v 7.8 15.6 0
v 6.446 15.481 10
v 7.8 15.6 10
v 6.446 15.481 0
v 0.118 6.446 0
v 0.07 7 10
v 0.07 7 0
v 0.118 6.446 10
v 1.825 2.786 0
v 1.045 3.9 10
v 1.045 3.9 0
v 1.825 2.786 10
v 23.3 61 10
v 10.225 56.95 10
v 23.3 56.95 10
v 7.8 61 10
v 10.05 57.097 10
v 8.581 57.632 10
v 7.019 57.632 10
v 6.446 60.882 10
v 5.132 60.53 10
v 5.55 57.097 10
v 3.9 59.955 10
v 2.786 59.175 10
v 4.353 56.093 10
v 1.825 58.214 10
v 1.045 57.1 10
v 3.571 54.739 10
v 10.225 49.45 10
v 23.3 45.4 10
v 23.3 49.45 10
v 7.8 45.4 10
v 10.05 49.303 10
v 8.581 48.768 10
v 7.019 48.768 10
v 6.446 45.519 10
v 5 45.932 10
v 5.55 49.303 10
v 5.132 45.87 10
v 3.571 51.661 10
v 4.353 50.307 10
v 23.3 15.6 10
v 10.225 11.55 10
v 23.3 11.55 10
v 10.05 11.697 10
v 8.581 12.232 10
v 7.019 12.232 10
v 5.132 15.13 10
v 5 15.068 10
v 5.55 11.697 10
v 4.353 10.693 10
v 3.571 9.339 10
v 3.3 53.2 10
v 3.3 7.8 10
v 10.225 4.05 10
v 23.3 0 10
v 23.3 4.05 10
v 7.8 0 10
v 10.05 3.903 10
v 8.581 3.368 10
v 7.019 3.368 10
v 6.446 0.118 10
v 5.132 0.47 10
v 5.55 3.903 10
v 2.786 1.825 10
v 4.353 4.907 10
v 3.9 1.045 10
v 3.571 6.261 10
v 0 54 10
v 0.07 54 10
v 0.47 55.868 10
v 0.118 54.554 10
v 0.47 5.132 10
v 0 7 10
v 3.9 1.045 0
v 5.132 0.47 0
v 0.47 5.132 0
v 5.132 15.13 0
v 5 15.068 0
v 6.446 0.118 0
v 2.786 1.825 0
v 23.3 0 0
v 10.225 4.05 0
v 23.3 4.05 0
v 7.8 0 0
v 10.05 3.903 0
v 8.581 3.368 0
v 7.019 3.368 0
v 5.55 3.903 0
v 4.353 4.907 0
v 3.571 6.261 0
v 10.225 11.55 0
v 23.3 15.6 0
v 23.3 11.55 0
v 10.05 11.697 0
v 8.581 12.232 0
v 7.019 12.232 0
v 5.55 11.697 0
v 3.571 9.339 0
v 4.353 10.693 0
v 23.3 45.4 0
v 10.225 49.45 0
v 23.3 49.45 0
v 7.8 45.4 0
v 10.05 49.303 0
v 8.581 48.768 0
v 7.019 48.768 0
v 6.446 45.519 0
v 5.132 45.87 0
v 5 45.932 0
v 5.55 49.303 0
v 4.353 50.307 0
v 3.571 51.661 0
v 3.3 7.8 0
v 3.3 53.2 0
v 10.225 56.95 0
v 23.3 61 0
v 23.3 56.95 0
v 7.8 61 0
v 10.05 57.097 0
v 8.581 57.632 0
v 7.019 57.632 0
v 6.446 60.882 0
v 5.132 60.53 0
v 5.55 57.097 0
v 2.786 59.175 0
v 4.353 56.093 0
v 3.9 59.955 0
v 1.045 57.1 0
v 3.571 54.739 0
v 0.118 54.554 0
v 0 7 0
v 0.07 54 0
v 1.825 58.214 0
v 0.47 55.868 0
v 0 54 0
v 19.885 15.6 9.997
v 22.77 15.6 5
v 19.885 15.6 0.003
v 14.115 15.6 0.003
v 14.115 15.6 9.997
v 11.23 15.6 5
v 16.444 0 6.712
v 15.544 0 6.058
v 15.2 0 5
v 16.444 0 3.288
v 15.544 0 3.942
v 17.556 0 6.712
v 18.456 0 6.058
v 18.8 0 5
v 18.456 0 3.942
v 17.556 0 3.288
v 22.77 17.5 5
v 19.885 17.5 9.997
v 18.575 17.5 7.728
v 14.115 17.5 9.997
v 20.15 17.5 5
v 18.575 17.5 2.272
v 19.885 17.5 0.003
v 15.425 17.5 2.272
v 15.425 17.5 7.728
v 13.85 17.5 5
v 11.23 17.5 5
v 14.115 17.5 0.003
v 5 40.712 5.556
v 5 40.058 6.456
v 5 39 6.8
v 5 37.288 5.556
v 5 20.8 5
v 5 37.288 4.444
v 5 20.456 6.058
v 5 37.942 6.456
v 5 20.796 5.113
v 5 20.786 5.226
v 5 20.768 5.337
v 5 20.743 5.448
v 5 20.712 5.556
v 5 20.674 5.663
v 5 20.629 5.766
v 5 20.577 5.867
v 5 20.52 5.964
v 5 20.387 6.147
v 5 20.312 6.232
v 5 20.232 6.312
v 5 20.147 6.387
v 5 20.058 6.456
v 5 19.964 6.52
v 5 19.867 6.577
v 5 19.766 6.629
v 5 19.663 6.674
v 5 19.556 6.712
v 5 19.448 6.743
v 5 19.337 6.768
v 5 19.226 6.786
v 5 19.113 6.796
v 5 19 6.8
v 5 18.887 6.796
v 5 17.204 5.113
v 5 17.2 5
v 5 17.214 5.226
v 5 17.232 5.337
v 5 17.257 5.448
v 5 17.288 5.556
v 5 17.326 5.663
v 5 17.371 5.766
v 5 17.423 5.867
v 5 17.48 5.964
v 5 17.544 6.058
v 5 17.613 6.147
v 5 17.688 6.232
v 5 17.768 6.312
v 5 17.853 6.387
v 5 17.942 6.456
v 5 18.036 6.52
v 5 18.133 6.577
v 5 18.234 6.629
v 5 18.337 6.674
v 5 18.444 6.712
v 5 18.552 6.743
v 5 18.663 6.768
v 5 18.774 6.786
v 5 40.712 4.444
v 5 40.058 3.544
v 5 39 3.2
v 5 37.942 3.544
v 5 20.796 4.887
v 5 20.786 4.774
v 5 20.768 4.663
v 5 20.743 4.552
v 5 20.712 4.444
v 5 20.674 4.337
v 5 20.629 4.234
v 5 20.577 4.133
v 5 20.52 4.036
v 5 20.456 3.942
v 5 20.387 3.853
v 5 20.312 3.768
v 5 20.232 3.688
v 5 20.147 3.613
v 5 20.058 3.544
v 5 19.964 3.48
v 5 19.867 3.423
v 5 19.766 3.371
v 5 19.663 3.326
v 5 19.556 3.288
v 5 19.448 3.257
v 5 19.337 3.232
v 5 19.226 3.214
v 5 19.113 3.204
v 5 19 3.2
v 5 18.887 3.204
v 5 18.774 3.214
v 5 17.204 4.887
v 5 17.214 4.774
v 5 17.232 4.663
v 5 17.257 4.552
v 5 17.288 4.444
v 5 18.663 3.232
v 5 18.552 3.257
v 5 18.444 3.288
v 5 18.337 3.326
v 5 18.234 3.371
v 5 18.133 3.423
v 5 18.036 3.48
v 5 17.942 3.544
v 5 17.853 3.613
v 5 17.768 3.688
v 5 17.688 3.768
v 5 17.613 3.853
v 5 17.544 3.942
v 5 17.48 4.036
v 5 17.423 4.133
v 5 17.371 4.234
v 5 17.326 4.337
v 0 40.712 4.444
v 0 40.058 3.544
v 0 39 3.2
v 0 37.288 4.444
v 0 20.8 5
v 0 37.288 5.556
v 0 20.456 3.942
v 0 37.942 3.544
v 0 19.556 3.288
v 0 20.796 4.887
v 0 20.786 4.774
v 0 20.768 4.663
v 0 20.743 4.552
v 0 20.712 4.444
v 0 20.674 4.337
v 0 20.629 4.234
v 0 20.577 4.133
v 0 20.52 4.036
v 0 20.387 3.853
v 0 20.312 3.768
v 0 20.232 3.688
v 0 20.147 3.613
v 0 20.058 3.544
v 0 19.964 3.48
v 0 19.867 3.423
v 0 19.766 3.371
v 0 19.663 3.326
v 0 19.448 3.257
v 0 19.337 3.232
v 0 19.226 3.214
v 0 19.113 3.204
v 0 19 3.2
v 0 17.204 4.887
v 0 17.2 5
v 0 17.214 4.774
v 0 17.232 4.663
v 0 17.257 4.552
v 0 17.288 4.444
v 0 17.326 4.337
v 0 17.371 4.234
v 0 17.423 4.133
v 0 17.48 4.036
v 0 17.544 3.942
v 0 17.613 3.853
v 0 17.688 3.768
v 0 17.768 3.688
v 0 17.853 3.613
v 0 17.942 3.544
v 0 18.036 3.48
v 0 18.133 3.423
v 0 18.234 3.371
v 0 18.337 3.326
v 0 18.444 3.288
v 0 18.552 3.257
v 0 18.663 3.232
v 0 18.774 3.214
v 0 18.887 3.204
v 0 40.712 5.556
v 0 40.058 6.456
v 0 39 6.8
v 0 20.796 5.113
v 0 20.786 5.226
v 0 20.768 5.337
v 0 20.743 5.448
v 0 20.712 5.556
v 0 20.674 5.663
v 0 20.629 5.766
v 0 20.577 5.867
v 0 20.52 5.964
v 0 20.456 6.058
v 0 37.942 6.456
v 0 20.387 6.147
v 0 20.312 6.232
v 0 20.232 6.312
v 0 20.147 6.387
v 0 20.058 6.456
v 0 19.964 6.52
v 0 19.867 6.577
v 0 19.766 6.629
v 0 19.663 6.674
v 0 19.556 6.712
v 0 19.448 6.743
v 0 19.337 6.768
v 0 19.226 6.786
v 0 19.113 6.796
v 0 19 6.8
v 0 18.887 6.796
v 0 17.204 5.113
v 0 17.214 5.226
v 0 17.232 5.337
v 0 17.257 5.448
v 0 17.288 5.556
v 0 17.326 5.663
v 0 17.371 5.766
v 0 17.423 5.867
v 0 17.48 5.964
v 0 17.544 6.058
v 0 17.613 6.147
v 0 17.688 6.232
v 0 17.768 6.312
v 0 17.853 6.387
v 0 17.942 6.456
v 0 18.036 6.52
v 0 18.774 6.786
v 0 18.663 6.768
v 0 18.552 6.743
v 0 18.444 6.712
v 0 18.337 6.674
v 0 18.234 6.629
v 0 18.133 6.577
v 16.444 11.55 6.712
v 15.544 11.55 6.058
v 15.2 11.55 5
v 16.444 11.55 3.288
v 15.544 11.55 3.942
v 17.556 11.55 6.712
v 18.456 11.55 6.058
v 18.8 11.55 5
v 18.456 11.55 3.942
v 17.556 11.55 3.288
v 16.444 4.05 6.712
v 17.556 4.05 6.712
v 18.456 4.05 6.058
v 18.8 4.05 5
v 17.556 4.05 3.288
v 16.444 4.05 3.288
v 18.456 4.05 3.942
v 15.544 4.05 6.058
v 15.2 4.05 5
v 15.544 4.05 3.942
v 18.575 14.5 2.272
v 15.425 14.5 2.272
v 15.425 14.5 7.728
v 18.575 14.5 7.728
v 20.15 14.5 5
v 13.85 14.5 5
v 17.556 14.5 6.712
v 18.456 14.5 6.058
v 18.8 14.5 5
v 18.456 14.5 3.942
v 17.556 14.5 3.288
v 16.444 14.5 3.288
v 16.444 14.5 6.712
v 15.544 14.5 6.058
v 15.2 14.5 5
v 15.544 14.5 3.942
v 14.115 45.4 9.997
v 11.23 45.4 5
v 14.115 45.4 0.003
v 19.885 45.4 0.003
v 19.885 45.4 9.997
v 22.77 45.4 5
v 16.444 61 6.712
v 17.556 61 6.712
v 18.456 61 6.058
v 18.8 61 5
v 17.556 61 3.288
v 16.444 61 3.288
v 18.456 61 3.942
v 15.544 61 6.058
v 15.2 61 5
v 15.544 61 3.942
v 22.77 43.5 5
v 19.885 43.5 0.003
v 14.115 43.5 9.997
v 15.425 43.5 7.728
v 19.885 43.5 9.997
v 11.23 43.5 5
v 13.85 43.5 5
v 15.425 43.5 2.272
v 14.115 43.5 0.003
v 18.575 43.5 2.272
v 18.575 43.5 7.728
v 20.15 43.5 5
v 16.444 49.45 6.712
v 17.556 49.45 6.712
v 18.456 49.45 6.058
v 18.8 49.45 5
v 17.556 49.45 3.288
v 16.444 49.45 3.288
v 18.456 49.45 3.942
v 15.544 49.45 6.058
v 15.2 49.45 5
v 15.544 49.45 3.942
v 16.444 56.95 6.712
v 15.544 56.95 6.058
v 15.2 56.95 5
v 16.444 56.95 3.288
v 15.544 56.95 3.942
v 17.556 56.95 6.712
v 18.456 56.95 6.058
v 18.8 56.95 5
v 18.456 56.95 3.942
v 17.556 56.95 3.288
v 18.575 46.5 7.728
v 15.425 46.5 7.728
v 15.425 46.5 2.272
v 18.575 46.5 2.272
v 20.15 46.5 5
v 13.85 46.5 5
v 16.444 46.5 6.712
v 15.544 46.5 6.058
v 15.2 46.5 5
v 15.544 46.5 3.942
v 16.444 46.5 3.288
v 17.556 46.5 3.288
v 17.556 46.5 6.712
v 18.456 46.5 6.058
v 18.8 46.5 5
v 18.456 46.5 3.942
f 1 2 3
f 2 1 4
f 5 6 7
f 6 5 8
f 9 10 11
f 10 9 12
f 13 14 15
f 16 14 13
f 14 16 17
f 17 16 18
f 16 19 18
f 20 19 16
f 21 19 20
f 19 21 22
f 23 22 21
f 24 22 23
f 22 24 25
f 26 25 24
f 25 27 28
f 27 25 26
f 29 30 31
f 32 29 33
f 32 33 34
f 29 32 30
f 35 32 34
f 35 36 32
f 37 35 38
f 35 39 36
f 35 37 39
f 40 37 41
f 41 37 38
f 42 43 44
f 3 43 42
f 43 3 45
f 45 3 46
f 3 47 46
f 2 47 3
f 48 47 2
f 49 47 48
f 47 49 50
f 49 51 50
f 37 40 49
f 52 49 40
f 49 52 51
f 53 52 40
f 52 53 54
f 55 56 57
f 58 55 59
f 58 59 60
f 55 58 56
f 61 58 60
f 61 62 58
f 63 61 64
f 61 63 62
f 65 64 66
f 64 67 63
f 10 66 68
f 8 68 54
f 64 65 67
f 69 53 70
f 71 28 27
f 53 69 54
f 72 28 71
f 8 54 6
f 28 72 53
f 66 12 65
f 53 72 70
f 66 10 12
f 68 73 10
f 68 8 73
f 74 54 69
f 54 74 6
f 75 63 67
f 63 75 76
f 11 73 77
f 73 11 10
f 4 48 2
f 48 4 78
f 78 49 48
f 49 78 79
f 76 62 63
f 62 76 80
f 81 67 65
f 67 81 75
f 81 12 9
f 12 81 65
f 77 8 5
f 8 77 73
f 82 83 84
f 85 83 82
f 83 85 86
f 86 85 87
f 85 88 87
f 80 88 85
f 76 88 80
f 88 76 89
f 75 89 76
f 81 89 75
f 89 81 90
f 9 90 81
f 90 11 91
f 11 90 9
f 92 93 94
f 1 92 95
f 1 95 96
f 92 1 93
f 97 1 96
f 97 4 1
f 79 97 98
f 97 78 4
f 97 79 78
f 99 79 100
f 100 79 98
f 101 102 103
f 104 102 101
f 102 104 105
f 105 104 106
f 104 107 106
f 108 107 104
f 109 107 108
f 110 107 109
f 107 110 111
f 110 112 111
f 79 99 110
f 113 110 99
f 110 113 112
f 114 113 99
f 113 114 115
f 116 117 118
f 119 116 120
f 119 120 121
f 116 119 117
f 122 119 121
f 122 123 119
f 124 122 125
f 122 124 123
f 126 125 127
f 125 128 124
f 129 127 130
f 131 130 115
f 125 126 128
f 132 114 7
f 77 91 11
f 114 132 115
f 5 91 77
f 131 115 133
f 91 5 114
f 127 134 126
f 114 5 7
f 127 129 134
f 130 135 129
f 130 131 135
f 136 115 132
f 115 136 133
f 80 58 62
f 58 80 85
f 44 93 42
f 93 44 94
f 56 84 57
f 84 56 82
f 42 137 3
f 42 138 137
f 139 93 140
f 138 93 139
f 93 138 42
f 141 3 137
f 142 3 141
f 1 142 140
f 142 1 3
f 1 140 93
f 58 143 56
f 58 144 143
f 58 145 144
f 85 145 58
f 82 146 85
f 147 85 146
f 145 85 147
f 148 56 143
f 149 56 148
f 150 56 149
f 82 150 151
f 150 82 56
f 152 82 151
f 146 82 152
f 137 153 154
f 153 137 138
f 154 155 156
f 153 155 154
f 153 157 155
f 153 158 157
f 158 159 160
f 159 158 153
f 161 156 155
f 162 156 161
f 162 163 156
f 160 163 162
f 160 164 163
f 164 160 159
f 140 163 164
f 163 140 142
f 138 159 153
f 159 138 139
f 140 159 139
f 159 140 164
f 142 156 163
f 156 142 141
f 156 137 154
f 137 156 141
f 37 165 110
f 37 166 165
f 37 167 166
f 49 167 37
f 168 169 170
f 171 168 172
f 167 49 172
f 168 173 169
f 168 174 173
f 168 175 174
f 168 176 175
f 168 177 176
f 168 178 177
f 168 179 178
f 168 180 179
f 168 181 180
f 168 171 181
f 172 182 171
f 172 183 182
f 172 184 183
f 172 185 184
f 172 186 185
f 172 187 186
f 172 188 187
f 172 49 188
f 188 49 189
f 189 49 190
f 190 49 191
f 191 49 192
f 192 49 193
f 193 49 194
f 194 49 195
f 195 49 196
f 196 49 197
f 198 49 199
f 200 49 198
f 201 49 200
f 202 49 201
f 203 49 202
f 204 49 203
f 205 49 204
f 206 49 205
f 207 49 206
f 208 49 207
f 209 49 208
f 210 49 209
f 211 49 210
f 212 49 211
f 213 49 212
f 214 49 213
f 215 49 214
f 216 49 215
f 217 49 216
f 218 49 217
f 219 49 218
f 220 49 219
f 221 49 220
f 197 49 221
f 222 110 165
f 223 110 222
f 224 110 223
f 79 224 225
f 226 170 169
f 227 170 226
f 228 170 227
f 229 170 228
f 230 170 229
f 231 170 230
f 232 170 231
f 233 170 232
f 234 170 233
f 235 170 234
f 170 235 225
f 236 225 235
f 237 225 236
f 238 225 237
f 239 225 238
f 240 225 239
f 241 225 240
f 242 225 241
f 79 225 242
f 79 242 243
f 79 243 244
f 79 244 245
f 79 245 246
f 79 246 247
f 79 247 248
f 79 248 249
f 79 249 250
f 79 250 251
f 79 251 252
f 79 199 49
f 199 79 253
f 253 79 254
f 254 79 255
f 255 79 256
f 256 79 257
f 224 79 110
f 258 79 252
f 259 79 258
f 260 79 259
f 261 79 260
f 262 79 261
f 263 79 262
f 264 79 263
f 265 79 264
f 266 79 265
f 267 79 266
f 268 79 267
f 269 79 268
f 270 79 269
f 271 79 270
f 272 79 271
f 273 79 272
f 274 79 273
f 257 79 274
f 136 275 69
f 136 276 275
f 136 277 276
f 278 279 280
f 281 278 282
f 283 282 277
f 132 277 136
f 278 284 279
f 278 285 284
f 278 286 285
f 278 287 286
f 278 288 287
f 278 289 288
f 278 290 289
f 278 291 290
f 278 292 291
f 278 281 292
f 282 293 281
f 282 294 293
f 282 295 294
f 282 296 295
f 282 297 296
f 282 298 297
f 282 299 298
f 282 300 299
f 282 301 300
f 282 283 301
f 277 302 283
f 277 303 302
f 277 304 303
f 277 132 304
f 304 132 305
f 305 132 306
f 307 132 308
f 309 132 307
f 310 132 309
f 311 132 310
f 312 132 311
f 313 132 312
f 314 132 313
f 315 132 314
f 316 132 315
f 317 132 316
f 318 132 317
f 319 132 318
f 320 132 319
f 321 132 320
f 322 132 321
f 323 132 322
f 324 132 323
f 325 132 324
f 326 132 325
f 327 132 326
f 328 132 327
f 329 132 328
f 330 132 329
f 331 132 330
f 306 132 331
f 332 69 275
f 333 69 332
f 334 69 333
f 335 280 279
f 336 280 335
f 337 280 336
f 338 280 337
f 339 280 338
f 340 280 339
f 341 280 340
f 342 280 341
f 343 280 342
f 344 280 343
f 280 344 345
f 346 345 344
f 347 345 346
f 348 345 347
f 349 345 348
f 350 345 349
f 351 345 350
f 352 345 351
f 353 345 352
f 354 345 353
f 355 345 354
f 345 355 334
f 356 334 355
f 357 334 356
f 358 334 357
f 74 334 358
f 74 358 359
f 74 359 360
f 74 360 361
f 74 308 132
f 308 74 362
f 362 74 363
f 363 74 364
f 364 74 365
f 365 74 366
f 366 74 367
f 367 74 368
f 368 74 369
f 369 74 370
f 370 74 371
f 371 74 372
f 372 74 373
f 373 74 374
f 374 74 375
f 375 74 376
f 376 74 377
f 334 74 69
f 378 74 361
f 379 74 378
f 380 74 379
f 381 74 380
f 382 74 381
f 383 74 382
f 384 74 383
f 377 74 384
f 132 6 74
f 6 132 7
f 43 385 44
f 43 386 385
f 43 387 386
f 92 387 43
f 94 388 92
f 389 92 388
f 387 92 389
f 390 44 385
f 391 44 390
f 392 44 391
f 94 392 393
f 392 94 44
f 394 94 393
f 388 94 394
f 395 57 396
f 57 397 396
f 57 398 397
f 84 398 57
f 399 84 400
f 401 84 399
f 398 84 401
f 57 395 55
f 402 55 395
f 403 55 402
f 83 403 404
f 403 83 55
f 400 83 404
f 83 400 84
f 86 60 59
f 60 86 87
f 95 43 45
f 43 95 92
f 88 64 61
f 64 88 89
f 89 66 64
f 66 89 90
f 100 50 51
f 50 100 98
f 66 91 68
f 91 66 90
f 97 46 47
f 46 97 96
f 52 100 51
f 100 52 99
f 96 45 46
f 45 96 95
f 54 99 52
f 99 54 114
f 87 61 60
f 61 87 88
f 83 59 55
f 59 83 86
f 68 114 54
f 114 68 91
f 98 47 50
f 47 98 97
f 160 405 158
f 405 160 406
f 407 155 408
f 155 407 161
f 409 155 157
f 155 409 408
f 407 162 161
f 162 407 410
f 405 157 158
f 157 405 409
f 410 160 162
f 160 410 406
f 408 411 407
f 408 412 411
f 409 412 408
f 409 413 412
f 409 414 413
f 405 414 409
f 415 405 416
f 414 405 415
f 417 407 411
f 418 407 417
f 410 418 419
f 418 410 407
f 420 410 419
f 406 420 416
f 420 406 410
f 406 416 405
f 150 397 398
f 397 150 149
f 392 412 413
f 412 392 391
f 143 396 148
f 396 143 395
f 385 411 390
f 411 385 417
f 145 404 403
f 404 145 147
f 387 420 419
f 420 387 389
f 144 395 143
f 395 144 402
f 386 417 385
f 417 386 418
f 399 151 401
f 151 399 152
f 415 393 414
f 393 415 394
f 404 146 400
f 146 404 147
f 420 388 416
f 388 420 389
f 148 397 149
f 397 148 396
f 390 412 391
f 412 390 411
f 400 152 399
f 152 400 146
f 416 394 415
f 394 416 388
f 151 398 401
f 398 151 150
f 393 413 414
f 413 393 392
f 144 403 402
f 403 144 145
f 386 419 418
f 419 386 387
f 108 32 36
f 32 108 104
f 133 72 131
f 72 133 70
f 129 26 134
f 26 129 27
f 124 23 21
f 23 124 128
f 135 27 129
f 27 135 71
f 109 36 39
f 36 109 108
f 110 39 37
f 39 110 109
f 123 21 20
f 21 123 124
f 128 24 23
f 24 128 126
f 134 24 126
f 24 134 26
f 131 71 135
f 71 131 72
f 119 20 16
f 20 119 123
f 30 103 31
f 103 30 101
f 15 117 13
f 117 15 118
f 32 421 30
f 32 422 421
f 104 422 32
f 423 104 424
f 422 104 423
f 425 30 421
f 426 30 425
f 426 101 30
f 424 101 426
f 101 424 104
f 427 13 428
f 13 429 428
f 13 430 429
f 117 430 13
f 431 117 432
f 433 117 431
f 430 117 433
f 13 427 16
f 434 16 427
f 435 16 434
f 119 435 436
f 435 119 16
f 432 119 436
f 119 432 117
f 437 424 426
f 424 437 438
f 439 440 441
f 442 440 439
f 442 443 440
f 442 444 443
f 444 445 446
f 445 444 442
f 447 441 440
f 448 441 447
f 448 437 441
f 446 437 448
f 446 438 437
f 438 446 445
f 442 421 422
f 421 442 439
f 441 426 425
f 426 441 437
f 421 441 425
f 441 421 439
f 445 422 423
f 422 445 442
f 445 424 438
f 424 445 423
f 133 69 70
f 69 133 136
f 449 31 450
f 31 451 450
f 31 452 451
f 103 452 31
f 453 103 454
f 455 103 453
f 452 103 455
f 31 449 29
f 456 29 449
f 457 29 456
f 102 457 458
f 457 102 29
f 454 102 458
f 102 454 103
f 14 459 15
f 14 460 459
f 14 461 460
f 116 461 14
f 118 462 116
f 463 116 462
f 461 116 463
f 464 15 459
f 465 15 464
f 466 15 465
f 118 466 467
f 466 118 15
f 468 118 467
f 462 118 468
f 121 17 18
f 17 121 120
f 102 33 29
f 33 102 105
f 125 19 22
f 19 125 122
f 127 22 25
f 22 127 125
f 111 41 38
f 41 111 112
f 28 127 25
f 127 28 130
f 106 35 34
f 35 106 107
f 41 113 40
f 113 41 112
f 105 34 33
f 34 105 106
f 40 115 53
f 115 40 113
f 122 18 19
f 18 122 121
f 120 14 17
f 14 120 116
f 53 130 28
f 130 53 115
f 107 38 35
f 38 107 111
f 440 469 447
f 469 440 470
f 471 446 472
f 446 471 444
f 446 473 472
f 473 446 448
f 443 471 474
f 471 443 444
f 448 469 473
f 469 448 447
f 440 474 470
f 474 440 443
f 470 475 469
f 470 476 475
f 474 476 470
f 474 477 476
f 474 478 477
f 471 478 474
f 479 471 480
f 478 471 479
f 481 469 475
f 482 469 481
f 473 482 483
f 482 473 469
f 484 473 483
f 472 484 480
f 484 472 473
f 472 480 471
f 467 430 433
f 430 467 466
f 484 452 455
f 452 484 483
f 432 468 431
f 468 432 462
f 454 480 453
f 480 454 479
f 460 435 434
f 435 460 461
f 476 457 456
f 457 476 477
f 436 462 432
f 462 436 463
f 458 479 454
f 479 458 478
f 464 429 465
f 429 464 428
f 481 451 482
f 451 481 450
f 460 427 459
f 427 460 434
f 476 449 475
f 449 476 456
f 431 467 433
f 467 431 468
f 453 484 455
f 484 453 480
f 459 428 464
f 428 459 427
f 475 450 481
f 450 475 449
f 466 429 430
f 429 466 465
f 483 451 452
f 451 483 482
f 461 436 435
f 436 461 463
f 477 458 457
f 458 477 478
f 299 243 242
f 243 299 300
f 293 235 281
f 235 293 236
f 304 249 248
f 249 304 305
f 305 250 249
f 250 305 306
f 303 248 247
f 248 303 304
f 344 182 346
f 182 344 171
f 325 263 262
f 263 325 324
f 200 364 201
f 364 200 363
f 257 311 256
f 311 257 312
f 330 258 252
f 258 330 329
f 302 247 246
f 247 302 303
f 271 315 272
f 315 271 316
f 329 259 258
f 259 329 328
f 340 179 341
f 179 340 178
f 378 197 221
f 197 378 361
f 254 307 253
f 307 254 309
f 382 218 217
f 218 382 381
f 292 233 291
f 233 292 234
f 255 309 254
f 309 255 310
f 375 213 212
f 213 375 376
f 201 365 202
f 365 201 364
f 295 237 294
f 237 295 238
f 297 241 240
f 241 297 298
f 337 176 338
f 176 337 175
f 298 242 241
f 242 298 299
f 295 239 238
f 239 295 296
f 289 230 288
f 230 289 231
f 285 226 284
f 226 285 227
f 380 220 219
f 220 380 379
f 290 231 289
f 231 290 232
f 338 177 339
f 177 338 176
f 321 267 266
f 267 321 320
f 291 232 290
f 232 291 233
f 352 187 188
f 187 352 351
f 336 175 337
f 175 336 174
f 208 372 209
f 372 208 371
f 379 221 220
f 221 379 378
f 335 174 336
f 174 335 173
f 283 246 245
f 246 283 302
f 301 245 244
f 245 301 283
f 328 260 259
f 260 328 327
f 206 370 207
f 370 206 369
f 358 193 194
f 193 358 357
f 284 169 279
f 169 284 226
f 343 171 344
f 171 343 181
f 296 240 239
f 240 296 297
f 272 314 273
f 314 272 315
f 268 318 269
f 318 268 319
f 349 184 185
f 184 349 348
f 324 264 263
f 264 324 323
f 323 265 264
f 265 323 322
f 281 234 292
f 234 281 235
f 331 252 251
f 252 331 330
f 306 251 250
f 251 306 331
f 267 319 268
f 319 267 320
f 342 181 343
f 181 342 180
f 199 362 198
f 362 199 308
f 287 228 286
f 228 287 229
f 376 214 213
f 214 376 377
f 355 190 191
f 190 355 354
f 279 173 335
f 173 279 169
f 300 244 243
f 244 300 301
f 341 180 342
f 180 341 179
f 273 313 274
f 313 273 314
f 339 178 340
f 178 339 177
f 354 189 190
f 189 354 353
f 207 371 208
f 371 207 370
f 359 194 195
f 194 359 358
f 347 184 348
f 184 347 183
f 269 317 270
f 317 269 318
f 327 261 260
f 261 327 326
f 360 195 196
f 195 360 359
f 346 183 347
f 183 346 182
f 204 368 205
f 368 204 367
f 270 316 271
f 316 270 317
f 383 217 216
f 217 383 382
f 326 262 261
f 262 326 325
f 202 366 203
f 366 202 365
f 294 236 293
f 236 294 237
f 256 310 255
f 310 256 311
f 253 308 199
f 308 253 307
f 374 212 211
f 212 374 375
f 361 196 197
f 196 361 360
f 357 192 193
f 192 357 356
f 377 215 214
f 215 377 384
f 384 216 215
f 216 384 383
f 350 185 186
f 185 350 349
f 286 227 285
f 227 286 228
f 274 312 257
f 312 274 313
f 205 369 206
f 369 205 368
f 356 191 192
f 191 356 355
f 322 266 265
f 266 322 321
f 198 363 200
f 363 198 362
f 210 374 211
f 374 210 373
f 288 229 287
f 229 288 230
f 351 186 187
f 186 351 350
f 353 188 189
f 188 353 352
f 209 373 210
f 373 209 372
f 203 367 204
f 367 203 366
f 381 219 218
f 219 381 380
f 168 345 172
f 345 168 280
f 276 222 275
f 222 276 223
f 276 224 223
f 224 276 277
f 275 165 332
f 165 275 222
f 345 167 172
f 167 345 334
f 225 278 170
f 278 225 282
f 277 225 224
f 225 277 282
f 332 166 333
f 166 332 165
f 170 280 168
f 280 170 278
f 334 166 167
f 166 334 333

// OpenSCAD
// PRUSA Mendel  
// X-Endstop holder
// Used to attach endstop to 8mm X-rods
// GNU GPL v3
// Josef Průša
// josefprusa@me.com
// prusadjs.cz
// modified version creation Coen Roos 14 dec. 2012
// modified version creation Robert Moro 16 dec. 2012


/**
 * @id X-endstop-holder
 * @name X-Endstop holder
 * @category Printed
 * @using 1 m3x20xhex
 * @using 1 m3nut
 * @using 2 m3washer
 */

m3_nut_diameter_horizontal = 6.3;
m8_diameter=9;
m3_diameter=3.6;
outer_diameter = m8_diameter/2+3.3;
opening_size = m8_diameter-1.5; //openingsize
module endstop()
{
	// Rodclamp
	rodclamp(0);

	// Rodclamp
 	rotate(a=180, v=[1,0,0]) translate([0,-61,-10]) rodclamp(1);

	// Bridge between rodclamps
	translate([0,15,0])
	{
		difference()
		{
			cube([5,30,10]);
			// Holes for endstop switch
			union()
			{
				translate([-3,4,5]) rotate([0,90,0])
				{
					cylinder(h =120, r = m3_diameter/2, $fn = 100);
					translate([0,20,0])cylinder(h =12, r = m3_diameter/2, $fn = 10);
				}
			}
		}
	}

}

module rodclamp(switch)
{
 	difference()
	{
		union()
		{
			translate([outer_diameter, outer_diameter, 0]) cylinder(h =10, r = outer_diameter, $fn = 36);
			translate([outer_diameter, 0, 0]) cube([15.5,outer_diameter*2,10]);
			translate([17, 17.5, 5]) rotate([90, 0, 0]) cylinder(h =5, r = 5.77, $fn = 6);
			translate ([0,7,0]) cube([5,10,10]);
		}
		translate([9, outer_diameter-opening_size/2, -1]) cube([18,opening_size,20]);
		translate([outer_diameter, outer_diameter, -1]) cylinder(h =20, r = m8_diameter/2, $fn = 18);
		translate([17, 19.5, 5]) rotate([90, 0, 0]) cylinder(h =5, r = m3_nut_diameter_horizontal/2, $fn = 6);
		//Securing hole
		translate([17, 17, 5]) rotate([90, 0, 0]) cylinder(h =20, r = m3_diameter/2, $fn = 10);
	   }
}

endstop();

//rodclamp(0);
